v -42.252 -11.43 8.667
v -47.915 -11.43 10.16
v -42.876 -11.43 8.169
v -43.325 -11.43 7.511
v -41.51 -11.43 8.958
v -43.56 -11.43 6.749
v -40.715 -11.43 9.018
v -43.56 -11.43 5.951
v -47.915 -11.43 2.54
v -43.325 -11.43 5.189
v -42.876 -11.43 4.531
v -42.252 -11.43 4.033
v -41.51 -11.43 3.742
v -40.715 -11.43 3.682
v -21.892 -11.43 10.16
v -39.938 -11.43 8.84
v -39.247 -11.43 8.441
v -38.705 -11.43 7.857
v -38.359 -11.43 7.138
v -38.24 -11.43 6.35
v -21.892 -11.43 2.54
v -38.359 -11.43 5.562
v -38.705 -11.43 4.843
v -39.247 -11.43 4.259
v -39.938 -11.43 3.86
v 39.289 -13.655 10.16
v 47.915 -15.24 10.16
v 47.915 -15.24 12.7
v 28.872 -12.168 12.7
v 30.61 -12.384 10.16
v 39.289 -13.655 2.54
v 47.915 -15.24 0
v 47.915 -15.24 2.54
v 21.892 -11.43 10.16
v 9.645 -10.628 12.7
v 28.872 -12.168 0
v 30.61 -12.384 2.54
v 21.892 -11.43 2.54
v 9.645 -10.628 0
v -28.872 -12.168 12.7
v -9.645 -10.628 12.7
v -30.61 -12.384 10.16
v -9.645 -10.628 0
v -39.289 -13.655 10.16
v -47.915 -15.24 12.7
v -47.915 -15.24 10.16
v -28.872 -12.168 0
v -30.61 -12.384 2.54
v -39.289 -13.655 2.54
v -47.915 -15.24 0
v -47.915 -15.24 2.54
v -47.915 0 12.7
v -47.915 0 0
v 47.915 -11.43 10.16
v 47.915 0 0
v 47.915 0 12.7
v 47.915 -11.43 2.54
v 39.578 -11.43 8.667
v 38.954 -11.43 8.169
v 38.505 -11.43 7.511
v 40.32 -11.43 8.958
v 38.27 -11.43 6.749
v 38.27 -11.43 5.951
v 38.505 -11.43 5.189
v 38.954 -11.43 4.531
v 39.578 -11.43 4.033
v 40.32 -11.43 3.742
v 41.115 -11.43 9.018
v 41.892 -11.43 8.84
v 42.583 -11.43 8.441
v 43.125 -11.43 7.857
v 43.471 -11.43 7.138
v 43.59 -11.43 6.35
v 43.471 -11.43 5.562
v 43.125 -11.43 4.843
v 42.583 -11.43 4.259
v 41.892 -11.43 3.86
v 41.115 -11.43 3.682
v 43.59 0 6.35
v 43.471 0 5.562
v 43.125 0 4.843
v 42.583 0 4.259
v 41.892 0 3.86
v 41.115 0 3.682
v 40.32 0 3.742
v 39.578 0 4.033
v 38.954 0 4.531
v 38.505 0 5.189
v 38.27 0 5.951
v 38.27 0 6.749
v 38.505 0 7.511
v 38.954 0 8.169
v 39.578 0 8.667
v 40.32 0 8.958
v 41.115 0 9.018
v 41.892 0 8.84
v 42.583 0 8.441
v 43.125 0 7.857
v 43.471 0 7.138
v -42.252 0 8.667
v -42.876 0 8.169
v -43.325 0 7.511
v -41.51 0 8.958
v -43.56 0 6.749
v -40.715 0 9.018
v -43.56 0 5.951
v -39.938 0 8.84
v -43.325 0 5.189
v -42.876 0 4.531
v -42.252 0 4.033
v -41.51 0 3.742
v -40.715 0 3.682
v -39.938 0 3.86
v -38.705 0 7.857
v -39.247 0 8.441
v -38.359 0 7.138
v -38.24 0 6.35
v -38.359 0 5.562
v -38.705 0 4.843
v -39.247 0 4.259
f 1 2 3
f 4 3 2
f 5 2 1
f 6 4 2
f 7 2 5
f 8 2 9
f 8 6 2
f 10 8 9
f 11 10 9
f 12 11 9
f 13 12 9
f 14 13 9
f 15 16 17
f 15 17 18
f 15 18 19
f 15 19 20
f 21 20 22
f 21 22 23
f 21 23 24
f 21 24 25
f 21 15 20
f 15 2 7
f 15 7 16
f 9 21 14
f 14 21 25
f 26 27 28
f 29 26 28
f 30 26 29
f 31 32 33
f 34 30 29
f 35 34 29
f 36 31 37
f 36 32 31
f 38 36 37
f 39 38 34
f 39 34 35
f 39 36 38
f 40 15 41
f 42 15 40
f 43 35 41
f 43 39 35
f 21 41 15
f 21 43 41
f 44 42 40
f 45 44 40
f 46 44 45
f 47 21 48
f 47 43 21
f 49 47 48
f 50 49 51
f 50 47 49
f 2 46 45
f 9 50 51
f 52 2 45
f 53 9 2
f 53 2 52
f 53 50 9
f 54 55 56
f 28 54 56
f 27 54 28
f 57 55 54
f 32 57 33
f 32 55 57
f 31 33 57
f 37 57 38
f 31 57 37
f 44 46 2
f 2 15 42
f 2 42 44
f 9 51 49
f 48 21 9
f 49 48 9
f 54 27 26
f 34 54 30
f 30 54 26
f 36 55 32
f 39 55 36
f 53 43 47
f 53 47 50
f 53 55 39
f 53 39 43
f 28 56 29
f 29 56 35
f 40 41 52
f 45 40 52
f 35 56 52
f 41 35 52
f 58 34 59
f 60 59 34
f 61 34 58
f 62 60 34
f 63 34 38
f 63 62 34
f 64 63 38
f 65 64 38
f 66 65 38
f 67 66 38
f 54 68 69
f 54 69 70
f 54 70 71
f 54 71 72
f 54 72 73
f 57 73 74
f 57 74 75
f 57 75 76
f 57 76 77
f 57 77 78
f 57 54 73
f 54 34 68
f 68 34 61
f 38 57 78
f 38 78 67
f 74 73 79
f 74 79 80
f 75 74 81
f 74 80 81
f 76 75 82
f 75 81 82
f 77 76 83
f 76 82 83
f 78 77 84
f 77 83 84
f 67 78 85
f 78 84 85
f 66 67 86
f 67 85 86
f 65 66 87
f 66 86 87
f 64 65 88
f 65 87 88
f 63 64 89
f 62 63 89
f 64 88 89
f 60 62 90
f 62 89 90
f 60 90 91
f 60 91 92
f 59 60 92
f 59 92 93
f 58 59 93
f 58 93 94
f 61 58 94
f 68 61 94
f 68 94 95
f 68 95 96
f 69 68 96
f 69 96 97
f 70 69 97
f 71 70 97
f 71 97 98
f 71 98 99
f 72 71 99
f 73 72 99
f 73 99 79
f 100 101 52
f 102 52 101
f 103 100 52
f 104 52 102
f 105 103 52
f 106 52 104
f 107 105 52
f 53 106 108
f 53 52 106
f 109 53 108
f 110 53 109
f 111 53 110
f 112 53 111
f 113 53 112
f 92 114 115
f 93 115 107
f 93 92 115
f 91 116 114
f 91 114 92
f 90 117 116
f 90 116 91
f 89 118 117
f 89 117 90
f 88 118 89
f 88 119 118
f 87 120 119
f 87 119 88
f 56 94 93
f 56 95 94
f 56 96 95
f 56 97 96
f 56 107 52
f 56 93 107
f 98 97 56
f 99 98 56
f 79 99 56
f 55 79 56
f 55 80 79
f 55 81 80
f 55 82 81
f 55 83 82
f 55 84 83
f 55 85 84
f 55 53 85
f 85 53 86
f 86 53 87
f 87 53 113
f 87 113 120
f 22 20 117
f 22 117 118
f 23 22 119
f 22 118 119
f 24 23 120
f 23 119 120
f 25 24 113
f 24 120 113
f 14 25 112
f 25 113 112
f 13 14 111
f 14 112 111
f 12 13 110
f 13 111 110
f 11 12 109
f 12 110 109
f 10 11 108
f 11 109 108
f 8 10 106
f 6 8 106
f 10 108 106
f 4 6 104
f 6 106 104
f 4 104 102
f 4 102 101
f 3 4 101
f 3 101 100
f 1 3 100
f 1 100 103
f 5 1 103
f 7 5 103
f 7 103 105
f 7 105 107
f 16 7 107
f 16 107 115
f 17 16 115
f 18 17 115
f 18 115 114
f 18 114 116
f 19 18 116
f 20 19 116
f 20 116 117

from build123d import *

# Parameters (mm, degrees)
BOSS_EXTRUDE1_DEPTH = 12.7
SKETCH2_R           = 2.675
CUT_EXTRUDE1_DEPTH  = 16.24
SKETCH3_W           = 7.62
SKETCH3_H           = 3.81
CUT_EXTRUDE2_DEPTH  = 96.8300001


with BuildPart() as part:
    # Sketch1 → Boss-Extrude1 (new body)
    with BuildSketch(Plane.XY):
        with BuildLine():
            Line((-47.915, 0), (47.915, 0))
            Line((47.915, 0), (47.915, -15.24))
            ThreePointArc((47.915, -15.24), (0, -10.434910675), (-47.915, -15.24))
            Line((-47.915, -15.24), (-47.915, 0))
        make_face()
    extrude(amount=BOSS_EXTRUDE1_DEPTH)

    # Sketch2 → Cut-Extrude1 (cut, through all)
    with BuildSketch(Plane(origin=(0, 0, 0), x_dir=(1, 0, 0), z_dir=(0, 1, 0))):
        with Locations((-40.915, -6.35)):
            Circle(SKETCH2_R)
        with Locations((40.915, -6.35)):
            Circle(SKETCH2_R)
    extrude(amount=-CUT_EXTRUDE1_DEPTH, mode=Mode.SUBTRACT)

    # Sketch3 → Cut-Extrude2 (cut, through all)
    with BuildSketch(Plane(origin=(47.915, 0, 0), x_dir=(0, 0, -1), z_dir=(1, 0, 0))):
        with Locations((-6.35, -13.335)):
            Rectangle(SKETCH3_W, SKETCH3_H)
    extrude(amount=-CUT_EXTRUDE2_DEPTH, mode=Mode.SUBTRACT)


solid = part.part
